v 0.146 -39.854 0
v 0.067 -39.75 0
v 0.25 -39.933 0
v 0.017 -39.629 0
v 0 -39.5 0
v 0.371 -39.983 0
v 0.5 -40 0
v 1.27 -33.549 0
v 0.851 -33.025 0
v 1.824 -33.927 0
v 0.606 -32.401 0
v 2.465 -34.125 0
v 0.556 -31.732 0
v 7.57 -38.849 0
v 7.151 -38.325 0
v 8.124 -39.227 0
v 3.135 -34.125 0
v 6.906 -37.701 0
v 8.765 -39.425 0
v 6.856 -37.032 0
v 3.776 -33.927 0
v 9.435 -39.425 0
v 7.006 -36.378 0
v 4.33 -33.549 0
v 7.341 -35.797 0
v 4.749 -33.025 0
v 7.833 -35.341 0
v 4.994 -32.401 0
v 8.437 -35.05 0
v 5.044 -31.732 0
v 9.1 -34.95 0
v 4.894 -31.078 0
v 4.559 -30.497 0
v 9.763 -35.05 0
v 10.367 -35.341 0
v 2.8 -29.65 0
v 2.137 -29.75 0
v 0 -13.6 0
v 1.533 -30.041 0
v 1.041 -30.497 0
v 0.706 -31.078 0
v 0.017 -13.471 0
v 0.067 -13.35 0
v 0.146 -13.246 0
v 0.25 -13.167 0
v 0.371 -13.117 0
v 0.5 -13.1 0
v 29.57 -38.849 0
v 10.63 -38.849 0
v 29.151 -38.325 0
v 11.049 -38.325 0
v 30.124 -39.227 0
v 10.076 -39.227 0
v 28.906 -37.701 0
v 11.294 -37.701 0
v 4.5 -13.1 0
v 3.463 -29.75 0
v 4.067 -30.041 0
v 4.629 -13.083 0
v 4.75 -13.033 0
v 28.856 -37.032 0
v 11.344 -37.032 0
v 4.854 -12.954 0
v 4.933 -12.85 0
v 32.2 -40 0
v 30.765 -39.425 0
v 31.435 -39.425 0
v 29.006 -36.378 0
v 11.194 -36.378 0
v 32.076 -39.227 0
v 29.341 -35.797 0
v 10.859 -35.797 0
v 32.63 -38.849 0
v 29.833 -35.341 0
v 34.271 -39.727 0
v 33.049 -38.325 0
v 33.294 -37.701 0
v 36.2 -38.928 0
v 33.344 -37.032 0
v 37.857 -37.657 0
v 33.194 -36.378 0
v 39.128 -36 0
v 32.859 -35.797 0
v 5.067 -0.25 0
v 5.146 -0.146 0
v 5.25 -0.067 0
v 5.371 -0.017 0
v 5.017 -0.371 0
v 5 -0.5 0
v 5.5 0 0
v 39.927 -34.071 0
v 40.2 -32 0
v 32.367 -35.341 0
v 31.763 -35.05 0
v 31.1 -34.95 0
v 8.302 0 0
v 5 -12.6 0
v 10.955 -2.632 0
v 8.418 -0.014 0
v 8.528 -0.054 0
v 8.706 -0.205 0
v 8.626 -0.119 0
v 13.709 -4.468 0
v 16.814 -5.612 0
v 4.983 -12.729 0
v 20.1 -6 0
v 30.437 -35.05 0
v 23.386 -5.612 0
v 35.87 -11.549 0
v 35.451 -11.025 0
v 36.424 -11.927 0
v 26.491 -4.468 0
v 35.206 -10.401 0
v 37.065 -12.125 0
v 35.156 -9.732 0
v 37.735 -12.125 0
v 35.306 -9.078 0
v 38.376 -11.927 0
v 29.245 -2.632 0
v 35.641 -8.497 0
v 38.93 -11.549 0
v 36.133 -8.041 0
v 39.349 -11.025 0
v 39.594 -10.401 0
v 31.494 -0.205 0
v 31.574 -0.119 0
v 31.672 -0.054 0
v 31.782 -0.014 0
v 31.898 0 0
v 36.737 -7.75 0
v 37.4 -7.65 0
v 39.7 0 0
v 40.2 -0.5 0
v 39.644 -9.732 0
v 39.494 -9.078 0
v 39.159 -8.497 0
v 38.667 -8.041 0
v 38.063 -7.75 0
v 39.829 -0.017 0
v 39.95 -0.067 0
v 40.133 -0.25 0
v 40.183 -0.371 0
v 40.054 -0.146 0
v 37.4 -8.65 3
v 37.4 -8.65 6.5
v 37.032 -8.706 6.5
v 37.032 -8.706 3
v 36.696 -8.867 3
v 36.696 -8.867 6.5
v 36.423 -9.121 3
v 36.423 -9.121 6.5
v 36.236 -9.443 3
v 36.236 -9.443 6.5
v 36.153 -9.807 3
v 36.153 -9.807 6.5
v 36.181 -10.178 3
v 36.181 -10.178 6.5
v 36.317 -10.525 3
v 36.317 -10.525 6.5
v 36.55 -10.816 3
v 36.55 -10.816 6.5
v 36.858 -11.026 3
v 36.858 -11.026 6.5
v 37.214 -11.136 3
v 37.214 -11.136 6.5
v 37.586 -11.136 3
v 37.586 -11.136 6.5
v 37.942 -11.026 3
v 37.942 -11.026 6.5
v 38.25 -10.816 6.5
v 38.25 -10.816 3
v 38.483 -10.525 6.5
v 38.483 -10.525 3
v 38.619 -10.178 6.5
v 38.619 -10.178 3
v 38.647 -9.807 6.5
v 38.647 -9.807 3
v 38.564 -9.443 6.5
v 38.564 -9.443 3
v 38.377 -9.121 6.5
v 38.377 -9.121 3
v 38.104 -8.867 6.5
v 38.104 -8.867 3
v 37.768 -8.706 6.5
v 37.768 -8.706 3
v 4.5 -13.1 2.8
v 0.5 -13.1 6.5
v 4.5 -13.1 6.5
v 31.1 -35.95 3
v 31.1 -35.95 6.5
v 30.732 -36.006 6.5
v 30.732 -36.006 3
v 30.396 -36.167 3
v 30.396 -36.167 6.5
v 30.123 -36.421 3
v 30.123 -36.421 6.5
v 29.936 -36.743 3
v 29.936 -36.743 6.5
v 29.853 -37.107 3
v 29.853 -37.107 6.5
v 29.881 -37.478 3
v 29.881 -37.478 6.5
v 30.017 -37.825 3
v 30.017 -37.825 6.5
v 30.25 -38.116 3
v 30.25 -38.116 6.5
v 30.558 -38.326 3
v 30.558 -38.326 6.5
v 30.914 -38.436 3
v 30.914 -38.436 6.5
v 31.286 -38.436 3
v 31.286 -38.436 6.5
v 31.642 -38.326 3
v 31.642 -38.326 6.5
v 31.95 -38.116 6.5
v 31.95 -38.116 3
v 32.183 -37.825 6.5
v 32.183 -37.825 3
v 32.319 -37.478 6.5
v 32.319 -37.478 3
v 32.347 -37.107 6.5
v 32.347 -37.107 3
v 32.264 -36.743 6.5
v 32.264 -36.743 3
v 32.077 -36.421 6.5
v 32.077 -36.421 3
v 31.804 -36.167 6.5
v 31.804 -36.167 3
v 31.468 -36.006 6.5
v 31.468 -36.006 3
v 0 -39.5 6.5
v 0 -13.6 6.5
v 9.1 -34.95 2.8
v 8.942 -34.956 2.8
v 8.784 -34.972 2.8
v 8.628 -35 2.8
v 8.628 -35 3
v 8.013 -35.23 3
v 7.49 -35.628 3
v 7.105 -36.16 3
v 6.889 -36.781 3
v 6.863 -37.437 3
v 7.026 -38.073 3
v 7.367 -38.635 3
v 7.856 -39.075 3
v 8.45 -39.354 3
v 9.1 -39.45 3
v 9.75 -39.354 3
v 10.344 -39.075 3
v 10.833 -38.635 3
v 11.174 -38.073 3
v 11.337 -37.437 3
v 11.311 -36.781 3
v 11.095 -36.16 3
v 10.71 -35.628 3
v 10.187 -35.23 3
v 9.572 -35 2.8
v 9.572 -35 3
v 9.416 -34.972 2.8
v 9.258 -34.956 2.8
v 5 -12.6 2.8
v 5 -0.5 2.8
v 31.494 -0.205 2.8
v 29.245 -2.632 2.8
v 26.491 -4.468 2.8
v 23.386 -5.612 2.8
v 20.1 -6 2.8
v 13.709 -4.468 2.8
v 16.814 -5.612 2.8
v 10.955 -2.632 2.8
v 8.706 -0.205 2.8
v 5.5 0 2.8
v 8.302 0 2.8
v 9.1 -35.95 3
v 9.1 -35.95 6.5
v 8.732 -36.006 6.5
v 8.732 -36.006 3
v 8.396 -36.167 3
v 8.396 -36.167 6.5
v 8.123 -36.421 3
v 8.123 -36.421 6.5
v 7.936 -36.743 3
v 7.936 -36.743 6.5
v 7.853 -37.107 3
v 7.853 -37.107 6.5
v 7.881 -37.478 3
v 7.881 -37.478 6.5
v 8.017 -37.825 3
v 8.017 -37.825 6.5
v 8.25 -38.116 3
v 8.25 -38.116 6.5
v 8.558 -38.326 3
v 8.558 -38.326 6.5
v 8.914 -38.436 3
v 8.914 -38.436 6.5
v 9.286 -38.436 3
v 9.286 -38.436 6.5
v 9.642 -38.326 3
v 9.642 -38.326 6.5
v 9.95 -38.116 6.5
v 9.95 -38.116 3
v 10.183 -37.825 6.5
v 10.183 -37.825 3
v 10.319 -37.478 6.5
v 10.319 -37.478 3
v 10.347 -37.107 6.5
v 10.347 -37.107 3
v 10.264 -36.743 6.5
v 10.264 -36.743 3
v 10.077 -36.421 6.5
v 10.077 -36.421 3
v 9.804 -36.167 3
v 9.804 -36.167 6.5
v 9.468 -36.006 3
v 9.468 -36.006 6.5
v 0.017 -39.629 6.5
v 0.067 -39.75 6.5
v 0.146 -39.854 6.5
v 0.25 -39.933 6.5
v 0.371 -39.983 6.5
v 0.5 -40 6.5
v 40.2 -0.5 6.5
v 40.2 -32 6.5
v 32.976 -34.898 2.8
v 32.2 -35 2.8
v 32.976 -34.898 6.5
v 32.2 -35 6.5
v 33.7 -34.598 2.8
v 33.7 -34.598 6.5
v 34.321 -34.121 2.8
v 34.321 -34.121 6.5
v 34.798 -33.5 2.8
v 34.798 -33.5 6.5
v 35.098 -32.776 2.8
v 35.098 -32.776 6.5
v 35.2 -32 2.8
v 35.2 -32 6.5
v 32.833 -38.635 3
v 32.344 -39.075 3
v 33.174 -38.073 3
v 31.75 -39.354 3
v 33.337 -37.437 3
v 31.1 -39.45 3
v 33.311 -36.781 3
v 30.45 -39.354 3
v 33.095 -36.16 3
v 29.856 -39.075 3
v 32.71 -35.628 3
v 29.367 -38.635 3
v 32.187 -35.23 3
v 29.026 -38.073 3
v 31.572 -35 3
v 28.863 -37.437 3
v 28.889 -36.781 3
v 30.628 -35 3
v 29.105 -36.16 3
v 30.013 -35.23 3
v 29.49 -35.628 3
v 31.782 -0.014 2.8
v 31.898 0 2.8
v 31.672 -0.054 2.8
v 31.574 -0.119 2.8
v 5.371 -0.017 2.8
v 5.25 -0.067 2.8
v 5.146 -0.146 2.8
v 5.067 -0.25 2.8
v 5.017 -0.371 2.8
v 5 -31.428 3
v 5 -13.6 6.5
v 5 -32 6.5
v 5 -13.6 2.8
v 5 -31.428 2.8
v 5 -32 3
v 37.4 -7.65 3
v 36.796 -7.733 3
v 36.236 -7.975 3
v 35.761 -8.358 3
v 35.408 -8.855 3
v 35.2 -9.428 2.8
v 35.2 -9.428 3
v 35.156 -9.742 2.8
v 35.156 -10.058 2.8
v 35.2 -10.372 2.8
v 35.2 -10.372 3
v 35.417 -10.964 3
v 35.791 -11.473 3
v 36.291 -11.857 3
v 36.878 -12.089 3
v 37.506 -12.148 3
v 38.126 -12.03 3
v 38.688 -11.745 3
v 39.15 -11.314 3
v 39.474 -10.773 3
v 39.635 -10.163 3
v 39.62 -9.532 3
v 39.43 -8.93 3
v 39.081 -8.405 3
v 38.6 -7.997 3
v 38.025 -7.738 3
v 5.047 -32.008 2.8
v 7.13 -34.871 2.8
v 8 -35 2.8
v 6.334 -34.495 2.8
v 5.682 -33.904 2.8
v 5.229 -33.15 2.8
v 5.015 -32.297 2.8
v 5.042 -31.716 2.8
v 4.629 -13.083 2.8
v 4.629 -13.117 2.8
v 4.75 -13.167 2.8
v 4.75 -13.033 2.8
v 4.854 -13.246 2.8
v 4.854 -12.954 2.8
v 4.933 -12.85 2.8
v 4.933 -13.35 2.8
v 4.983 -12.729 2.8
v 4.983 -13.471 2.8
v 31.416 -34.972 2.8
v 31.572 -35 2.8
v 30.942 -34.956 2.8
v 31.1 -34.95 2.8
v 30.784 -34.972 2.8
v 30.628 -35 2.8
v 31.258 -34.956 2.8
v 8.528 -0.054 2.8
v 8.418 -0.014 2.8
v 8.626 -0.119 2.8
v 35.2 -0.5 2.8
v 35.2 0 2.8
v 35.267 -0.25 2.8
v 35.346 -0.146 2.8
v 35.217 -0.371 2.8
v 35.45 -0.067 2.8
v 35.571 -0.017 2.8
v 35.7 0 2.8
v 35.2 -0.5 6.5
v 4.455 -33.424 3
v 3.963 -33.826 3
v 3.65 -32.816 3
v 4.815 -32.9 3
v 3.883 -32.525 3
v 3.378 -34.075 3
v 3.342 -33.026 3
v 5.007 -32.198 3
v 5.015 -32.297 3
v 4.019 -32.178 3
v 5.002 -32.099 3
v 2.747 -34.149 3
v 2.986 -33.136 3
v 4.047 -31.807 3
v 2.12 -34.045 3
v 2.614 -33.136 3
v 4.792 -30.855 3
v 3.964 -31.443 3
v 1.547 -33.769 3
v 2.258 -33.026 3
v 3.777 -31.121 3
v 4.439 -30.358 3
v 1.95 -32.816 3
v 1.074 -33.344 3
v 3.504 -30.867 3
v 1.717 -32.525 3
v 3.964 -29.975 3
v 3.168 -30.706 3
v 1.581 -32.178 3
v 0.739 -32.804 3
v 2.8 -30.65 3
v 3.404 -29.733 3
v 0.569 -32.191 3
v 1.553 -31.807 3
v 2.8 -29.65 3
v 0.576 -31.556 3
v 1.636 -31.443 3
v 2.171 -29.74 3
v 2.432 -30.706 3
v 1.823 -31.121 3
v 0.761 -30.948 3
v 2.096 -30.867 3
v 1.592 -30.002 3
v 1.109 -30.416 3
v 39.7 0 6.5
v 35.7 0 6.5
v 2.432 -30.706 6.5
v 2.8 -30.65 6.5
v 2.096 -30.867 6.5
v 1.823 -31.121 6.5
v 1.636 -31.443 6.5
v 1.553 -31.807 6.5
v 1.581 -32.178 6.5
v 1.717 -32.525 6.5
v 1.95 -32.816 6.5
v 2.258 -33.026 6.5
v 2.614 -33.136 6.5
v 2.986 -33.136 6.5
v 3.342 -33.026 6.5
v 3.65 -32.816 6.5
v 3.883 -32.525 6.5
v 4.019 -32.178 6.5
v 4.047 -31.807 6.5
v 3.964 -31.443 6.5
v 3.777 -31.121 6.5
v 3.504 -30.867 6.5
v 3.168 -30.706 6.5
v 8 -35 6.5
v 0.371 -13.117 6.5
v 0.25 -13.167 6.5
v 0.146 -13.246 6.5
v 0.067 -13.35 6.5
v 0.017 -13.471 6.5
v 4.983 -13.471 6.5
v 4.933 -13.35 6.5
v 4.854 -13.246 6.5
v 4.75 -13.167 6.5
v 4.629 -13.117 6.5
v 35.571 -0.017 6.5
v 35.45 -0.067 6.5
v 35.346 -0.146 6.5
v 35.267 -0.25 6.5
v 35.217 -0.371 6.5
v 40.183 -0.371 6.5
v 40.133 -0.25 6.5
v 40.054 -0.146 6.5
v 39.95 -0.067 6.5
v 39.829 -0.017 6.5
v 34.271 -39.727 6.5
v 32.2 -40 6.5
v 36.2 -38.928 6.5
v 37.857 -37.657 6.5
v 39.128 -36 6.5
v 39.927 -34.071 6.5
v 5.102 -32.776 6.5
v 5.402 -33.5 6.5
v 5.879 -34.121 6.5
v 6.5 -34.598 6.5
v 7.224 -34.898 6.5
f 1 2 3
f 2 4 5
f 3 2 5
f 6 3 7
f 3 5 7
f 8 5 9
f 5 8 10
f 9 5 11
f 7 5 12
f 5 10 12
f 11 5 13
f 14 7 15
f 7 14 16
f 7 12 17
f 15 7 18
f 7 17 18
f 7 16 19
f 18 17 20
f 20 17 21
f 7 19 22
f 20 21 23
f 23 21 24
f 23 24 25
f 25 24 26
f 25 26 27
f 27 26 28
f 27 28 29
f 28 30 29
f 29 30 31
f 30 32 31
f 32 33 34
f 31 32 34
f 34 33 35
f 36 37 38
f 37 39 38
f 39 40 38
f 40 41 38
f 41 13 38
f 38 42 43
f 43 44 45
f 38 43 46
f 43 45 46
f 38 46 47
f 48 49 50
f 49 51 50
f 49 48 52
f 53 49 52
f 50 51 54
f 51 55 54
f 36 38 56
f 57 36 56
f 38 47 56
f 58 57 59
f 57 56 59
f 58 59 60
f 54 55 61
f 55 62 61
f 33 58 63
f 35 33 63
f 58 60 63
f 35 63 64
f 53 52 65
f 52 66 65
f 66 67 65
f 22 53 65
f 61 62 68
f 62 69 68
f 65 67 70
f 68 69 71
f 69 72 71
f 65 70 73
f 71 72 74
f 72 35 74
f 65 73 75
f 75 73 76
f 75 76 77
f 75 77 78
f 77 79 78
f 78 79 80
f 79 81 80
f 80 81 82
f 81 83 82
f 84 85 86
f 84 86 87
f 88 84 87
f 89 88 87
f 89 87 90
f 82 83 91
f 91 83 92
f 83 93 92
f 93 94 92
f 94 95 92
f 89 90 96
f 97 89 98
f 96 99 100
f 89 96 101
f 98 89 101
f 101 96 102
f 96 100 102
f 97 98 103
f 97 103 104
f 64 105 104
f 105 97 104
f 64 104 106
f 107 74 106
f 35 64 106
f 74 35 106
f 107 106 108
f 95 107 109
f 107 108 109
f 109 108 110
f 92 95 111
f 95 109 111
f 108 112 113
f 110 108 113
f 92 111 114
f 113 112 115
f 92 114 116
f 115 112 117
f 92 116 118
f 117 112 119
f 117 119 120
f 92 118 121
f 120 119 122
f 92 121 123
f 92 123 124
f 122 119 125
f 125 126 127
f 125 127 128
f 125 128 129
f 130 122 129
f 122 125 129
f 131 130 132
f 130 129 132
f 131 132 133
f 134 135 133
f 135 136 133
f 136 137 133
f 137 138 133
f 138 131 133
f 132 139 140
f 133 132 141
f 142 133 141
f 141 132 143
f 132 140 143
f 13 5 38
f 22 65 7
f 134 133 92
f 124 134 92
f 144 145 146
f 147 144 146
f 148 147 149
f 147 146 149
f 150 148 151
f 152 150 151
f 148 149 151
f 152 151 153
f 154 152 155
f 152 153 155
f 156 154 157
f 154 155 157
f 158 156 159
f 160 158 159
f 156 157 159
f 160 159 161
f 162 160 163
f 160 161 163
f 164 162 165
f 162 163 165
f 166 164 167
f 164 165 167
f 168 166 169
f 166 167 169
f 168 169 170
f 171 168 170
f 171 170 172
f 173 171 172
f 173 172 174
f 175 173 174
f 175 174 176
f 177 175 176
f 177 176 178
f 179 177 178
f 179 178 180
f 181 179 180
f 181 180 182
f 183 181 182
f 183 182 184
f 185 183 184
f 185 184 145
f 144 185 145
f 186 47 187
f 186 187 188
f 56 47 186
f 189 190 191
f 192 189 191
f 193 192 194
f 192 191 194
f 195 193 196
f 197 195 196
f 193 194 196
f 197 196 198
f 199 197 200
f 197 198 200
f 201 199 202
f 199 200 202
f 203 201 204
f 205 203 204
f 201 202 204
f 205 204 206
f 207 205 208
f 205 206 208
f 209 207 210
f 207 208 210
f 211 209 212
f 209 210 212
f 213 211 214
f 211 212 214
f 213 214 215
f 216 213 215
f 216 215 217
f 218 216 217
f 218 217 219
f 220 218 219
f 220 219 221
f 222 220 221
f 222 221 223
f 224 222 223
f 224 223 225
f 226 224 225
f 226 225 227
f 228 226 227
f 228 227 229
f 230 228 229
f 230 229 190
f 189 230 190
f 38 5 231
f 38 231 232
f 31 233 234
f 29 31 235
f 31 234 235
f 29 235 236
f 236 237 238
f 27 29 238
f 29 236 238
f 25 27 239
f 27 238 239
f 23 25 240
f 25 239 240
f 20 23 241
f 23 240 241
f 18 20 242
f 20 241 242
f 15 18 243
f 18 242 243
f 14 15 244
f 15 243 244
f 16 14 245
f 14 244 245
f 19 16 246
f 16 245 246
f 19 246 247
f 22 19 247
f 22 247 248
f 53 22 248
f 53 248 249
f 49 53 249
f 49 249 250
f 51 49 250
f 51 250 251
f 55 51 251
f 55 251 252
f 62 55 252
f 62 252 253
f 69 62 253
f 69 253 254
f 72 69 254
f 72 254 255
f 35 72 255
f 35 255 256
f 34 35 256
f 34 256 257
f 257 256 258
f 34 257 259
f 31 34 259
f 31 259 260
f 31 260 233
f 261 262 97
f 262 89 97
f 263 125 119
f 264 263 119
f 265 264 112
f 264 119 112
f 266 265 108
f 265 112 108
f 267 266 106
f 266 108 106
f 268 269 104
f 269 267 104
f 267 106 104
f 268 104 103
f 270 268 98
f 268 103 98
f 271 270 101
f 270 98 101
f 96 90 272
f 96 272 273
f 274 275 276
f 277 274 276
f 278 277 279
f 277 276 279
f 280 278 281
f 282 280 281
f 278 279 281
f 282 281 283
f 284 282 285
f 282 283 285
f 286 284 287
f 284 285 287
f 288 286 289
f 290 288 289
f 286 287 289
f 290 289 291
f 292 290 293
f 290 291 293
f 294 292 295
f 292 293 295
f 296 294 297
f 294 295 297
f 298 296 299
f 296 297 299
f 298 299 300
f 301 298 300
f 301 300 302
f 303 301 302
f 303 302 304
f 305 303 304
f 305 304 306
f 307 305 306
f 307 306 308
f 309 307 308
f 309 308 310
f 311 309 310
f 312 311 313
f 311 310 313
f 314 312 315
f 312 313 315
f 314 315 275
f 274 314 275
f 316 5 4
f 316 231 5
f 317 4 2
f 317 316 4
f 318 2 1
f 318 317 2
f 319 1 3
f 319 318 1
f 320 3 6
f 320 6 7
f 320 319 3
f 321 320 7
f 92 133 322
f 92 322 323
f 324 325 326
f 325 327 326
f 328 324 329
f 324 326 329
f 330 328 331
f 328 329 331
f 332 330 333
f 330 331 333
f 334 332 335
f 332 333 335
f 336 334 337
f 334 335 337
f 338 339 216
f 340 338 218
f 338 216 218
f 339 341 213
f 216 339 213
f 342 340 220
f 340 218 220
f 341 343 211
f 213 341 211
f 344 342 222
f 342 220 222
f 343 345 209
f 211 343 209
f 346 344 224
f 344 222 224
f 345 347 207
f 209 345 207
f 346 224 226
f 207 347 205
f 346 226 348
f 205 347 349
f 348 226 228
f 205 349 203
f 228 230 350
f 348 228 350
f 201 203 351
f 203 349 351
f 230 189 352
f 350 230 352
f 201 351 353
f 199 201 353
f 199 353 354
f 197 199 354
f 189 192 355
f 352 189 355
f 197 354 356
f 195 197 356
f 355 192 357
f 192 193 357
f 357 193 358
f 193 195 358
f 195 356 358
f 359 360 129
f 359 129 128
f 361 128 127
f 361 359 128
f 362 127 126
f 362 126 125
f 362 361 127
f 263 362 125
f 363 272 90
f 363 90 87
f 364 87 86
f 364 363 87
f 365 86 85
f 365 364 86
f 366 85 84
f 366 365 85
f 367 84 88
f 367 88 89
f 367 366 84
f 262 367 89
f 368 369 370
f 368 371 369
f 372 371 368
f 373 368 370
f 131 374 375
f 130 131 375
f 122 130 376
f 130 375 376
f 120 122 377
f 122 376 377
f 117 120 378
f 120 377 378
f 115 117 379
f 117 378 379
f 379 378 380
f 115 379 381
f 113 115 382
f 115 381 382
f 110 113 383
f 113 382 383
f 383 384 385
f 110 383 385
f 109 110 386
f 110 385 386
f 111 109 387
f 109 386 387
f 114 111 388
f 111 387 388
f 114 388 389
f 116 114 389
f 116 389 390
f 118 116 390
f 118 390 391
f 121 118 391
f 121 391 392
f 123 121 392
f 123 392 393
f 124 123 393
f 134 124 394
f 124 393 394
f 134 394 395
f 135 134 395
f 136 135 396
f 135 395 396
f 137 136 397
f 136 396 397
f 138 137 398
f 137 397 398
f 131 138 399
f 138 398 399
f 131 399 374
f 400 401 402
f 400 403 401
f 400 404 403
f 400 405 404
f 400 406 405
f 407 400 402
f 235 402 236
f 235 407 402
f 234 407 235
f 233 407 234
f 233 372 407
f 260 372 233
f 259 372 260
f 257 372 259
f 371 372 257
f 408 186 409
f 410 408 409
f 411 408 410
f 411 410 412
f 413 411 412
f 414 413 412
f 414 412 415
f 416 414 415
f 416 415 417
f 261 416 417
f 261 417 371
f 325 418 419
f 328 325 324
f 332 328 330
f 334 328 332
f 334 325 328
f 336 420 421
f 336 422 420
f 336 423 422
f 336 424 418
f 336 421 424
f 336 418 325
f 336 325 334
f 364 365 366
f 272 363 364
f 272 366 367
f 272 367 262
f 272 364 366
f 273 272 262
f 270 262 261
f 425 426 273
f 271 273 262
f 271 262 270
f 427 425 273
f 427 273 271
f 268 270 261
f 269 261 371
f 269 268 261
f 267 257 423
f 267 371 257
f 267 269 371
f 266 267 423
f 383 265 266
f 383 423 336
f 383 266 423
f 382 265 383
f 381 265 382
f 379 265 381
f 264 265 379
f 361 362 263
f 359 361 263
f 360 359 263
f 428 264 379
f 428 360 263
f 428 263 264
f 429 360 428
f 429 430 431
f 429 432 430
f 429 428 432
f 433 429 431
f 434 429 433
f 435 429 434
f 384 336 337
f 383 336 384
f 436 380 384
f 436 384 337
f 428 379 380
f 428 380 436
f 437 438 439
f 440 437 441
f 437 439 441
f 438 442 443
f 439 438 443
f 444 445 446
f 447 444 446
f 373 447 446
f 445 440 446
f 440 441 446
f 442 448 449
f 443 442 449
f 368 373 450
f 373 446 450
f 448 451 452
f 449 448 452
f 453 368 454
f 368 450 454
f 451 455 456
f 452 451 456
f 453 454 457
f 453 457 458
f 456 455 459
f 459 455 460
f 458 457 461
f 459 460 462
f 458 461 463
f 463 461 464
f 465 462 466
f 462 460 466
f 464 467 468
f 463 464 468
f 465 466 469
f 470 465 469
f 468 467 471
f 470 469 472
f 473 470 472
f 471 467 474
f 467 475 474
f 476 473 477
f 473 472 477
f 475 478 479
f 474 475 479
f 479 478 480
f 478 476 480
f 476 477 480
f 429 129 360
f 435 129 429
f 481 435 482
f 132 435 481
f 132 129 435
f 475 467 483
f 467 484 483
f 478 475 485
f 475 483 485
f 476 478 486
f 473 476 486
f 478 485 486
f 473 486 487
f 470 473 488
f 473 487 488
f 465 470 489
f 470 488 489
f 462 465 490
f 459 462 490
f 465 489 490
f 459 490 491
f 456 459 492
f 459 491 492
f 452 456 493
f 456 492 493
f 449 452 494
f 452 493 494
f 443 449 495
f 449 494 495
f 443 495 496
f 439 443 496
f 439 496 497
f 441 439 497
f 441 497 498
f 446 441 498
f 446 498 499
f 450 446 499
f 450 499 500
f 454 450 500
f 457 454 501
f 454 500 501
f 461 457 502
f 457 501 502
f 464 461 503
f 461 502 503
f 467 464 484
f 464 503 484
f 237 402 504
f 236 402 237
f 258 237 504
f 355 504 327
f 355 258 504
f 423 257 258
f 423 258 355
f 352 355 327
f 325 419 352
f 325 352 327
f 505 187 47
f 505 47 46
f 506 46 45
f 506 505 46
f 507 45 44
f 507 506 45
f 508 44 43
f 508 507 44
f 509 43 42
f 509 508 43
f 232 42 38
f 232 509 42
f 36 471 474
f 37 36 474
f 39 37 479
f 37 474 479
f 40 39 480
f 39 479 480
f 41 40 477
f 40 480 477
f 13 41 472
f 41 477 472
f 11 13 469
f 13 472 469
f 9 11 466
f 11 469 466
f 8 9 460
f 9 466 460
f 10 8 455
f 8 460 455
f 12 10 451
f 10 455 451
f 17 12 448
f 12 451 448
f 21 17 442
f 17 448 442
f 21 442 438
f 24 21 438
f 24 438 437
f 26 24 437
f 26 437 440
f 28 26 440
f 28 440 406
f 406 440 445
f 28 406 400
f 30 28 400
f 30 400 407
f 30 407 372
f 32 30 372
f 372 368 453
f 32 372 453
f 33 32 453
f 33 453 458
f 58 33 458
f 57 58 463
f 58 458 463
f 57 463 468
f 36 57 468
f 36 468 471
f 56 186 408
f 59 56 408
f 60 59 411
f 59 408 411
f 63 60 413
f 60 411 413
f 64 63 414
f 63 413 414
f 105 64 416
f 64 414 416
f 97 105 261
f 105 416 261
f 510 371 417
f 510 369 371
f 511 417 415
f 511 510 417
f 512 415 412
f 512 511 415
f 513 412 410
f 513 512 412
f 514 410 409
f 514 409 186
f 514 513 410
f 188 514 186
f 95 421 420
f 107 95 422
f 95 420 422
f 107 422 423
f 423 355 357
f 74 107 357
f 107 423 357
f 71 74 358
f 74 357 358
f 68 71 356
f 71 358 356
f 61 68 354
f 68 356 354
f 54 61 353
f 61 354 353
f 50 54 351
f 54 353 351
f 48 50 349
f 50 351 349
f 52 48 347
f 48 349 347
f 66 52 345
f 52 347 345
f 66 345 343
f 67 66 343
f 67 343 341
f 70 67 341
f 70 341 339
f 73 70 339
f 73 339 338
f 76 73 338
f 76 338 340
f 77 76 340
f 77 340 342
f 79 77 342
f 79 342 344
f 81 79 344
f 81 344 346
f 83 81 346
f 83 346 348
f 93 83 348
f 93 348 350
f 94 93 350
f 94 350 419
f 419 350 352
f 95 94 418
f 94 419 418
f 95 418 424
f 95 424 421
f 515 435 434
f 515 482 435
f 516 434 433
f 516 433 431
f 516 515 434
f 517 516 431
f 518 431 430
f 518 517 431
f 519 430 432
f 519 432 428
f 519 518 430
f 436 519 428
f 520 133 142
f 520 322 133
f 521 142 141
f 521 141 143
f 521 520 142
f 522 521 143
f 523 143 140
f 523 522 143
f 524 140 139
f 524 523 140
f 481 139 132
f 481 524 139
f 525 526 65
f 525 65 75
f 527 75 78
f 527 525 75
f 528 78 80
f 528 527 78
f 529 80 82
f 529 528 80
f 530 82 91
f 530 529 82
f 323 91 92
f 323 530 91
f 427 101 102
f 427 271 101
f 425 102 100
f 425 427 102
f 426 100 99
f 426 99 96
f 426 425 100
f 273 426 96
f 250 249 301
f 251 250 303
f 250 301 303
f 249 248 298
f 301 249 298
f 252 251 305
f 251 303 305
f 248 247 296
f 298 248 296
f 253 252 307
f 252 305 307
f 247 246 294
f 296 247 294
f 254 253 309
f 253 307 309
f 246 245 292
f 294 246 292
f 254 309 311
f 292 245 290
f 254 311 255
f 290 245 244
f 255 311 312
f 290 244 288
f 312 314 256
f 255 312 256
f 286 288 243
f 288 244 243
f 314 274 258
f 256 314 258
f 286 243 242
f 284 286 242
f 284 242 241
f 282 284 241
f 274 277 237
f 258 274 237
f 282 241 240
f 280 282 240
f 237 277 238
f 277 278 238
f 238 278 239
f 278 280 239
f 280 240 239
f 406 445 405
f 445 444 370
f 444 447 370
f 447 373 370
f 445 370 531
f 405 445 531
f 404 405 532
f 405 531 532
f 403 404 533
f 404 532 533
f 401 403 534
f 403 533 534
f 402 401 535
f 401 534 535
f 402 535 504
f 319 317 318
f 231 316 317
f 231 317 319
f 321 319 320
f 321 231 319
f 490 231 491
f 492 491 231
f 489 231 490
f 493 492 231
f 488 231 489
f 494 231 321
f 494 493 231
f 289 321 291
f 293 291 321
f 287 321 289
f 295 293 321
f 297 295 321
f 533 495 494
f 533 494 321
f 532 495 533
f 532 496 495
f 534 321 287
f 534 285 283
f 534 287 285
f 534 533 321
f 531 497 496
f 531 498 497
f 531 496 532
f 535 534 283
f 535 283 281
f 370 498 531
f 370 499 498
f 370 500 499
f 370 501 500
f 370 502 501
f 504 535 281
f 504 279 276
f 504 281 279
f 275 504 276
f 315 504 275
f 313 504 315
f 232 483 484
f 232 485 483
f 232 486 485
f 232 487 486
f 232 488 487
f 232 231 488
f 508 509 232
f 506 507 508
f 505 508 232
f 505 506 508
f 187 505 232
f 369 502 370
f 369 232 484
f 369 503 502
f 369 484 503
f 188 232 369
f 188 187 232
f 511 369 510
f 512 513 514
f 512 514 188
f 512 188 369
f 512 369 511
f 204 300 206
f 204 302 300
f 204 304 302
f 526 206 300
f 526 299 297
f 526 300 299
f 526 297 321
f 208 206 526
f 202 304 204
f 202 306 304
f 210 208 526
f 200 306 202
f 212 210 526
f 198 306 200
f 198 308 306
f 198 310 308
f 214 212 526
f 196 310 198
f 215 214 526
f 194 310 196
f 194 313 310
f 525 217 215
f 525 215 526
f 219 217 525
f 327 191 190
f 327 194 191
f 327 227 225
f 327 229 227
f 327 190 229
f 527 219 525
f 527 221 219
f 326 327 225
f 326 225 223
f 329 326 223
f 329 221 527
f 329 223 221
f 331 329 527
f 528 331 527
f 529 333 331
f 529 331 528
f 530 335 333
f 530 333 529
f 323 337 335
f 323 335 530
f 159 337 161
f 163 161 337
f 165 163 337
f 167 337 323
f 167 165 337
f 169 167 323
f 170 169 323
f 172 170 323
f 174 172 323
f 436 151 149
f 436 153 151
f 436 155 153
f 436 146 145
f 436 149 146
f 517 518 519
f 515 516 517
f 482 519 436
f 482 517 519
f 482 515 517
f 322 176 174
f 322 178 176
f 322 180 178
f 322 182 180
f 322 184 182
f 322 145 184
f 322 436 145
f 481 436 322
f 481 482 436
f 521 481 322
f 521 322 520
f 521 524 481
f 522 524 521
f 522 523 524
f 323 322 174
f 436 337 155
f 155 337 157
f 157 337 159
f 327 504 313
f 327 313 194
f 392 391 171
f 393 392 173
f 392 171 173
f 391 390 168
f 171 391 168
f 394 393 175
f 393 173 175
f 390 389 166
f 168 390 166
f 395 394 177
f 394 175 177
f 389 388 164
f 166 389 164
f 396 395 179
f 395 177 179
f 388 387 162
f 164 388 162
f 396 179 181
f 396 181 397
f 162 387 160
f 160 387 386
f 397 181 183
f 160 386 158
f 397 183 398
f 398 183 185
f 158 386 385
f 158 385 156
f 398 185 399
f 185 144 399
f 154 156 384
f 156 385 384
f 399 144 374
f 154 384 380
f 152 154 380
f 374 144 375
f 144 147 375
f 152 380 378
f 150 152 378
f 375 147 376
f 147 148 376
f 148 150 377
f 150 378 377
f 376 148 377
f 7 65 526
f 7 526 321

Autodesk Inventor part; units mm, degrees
ref_plane "YZ Plane" through (0, 0, 0) normal (1, 0, 0) x (0, 1, 0)
ref_plane "XZ Plane" through (0, 0, 0) normal (0, 1, 0) x (-1, 0, 0)
ref_plane "XY Plane" through (0, 0, 0) normal (0, 0, 1) x (1, 0, 0)
sketch "Sketch2" plane through (0, 0, 0) normal (0, 0, 1) x (1, 0, 0)
  line L0 (0, 0) -> (5, 0) construction
  line L1 (40.2, 0) -> (40.2, -40)
  line L2 (40.2, -40) -> (0, -40)
  line L3 (0, -40) -> (0, -13.1)
  arc A0 (31.6412, 0) -> (8.5588, 0) centre (20.1, 8.1) ccw construction
  line L4 (31.6412, 0) -> (40.2, 0)
  line L5 (8.5588, 0) -> (31.6412, 0) construction
  arc A1 (8.5588, 0) -> (31.6412, 0) centre (20.1, 8.1) ccw
  line L6 (35.2, 0) -> (31.6412, 0)
  line L7 (5, 0) -> (5, -13.1)
  line L8 (5, -35) -> (35.2, -35)
  line L9 (35.2, -35) -> (35.2, 0)
  line L10 (0, -13.1) -> (5, -13.1)
  line L11 (0, -13.1) -> (0, 0) construction
  line L12 (5, -13.1) -> (5, -35)
  line L13 (5, 0) -> (8.5588, 0)
  line L14 (8.5588, 0) -> (5, 0)
  line L15 (31.6412, 0) -> (8.5588, 0) construction
  line L16 (20.1, 0) -> (20.1, 8.1)
  line L17 (31.1, -37.2) -> (40.2, -37.2) construction
  line L18 (9.1, -37.2) -> (0, -37.2) construction
  point P0 (2.8, -31.9)
  point P1 (37.4, -9.9)
  dimension "d0" = 40
  dimension "d1" = 40.2
  dimension "d55" = 28.2
  dimension "d56" = 5
  dimension "d57" = 5
  dimension "d58" = 5
  dimension "d59" = 26.9
  dimension "d66" = 48.1
  dimension "d67" = 2.8
  dimension "d68" = 2.8
  dimension "d69" = 2.8
  dimension "d70" = 22
  dimension "d72" = 30.1
  dimension "d73" = 8.1
  dimension "d74" = 2.8
extrude "Extrusion6" add sketch "Sketch2" along normal blind 6.5 contours L1 L2 L3 L10 L12 L8 L9 L4
extrude "Extrusion8" add sketch "Sketch2" along normal blind 2.8 contours L9 L8 L12 L7 L13 A1 L4
hole "Hole2" at (20.1, 8.1, 0) at (31.1, -37.2, 0) at (9.1, -37.2, 0) at (2.8, -31.9, 0) at (37.4, -9.9, 0) direction (0, 0, 1) diameter 2.5 end through all counterbore diameter 4.5 counterbore depth 3
fillet "Fillet1" radius 0.5 9 edges at (40.2, 0, 3.25) (35.2, 0, 4.65) (5, -13.1, 4.65) (5, -13.1, 1.4) (0, -13.1, 3.25) (0, -40, 3.25) (31.6412, 0, 1.4) (8.5588, 0, 1.4) (5, 0, 1.4)
fillet "Fillet2" radius 3 2 edges at (35.2, -35, 4.65) (5, -35, 4.65)
fillet "Fillet3" radius 8 1 edges at (40.2, -40, 3.25)
ref_plane "Work Plane1" through (-4.5, -39.5, 0) normal (-1, 0, 0) x (0, 0, 1)
equation "\"d1\" = side_to_side_outside_dist"
equation "\"d56\" = outside_inside_dist - tol"
equation "\"d57\" = outside_inside_dist - tol"
equation "\"d58\" = outside_inside_dist - tol"
equation "\"d66\" = front_to_axe"
equation "\"d67\" = holes_to_side"
equation "\"d68\" = holes_to_side"
equation "\"d69\" = holes_to_side"
equation "\"d74\" = holes_to_side"
equation "\"d60\" = outside_depth"
equation "\"outside_inside_dist\" = 5.1"
equation "\"outside_depth\" = 6.5"
equation "\"inside_depth\" = outside_depth - inside_to_outside"
equation "\"tol\" = 0.1"
equation "\"side_to_side_outside_dist\" = 40.2"
equation "\"front_to_torsebas\" = 27.1"
equation "\"front_to_axe\" = 48.1"
equation "\"palonnier_diameter\" = 28"
equation "\"holes_to_side\" = 2.8"
equation "\"inside_to_outside\" = 3.5"
equation "\"teflon_sheet_thickness\" = 10.5"
equation "\"stock_top_offset\" = teflon_sheet_thickness - outside_depth"
properties part number "high_leg_teflon_left"
